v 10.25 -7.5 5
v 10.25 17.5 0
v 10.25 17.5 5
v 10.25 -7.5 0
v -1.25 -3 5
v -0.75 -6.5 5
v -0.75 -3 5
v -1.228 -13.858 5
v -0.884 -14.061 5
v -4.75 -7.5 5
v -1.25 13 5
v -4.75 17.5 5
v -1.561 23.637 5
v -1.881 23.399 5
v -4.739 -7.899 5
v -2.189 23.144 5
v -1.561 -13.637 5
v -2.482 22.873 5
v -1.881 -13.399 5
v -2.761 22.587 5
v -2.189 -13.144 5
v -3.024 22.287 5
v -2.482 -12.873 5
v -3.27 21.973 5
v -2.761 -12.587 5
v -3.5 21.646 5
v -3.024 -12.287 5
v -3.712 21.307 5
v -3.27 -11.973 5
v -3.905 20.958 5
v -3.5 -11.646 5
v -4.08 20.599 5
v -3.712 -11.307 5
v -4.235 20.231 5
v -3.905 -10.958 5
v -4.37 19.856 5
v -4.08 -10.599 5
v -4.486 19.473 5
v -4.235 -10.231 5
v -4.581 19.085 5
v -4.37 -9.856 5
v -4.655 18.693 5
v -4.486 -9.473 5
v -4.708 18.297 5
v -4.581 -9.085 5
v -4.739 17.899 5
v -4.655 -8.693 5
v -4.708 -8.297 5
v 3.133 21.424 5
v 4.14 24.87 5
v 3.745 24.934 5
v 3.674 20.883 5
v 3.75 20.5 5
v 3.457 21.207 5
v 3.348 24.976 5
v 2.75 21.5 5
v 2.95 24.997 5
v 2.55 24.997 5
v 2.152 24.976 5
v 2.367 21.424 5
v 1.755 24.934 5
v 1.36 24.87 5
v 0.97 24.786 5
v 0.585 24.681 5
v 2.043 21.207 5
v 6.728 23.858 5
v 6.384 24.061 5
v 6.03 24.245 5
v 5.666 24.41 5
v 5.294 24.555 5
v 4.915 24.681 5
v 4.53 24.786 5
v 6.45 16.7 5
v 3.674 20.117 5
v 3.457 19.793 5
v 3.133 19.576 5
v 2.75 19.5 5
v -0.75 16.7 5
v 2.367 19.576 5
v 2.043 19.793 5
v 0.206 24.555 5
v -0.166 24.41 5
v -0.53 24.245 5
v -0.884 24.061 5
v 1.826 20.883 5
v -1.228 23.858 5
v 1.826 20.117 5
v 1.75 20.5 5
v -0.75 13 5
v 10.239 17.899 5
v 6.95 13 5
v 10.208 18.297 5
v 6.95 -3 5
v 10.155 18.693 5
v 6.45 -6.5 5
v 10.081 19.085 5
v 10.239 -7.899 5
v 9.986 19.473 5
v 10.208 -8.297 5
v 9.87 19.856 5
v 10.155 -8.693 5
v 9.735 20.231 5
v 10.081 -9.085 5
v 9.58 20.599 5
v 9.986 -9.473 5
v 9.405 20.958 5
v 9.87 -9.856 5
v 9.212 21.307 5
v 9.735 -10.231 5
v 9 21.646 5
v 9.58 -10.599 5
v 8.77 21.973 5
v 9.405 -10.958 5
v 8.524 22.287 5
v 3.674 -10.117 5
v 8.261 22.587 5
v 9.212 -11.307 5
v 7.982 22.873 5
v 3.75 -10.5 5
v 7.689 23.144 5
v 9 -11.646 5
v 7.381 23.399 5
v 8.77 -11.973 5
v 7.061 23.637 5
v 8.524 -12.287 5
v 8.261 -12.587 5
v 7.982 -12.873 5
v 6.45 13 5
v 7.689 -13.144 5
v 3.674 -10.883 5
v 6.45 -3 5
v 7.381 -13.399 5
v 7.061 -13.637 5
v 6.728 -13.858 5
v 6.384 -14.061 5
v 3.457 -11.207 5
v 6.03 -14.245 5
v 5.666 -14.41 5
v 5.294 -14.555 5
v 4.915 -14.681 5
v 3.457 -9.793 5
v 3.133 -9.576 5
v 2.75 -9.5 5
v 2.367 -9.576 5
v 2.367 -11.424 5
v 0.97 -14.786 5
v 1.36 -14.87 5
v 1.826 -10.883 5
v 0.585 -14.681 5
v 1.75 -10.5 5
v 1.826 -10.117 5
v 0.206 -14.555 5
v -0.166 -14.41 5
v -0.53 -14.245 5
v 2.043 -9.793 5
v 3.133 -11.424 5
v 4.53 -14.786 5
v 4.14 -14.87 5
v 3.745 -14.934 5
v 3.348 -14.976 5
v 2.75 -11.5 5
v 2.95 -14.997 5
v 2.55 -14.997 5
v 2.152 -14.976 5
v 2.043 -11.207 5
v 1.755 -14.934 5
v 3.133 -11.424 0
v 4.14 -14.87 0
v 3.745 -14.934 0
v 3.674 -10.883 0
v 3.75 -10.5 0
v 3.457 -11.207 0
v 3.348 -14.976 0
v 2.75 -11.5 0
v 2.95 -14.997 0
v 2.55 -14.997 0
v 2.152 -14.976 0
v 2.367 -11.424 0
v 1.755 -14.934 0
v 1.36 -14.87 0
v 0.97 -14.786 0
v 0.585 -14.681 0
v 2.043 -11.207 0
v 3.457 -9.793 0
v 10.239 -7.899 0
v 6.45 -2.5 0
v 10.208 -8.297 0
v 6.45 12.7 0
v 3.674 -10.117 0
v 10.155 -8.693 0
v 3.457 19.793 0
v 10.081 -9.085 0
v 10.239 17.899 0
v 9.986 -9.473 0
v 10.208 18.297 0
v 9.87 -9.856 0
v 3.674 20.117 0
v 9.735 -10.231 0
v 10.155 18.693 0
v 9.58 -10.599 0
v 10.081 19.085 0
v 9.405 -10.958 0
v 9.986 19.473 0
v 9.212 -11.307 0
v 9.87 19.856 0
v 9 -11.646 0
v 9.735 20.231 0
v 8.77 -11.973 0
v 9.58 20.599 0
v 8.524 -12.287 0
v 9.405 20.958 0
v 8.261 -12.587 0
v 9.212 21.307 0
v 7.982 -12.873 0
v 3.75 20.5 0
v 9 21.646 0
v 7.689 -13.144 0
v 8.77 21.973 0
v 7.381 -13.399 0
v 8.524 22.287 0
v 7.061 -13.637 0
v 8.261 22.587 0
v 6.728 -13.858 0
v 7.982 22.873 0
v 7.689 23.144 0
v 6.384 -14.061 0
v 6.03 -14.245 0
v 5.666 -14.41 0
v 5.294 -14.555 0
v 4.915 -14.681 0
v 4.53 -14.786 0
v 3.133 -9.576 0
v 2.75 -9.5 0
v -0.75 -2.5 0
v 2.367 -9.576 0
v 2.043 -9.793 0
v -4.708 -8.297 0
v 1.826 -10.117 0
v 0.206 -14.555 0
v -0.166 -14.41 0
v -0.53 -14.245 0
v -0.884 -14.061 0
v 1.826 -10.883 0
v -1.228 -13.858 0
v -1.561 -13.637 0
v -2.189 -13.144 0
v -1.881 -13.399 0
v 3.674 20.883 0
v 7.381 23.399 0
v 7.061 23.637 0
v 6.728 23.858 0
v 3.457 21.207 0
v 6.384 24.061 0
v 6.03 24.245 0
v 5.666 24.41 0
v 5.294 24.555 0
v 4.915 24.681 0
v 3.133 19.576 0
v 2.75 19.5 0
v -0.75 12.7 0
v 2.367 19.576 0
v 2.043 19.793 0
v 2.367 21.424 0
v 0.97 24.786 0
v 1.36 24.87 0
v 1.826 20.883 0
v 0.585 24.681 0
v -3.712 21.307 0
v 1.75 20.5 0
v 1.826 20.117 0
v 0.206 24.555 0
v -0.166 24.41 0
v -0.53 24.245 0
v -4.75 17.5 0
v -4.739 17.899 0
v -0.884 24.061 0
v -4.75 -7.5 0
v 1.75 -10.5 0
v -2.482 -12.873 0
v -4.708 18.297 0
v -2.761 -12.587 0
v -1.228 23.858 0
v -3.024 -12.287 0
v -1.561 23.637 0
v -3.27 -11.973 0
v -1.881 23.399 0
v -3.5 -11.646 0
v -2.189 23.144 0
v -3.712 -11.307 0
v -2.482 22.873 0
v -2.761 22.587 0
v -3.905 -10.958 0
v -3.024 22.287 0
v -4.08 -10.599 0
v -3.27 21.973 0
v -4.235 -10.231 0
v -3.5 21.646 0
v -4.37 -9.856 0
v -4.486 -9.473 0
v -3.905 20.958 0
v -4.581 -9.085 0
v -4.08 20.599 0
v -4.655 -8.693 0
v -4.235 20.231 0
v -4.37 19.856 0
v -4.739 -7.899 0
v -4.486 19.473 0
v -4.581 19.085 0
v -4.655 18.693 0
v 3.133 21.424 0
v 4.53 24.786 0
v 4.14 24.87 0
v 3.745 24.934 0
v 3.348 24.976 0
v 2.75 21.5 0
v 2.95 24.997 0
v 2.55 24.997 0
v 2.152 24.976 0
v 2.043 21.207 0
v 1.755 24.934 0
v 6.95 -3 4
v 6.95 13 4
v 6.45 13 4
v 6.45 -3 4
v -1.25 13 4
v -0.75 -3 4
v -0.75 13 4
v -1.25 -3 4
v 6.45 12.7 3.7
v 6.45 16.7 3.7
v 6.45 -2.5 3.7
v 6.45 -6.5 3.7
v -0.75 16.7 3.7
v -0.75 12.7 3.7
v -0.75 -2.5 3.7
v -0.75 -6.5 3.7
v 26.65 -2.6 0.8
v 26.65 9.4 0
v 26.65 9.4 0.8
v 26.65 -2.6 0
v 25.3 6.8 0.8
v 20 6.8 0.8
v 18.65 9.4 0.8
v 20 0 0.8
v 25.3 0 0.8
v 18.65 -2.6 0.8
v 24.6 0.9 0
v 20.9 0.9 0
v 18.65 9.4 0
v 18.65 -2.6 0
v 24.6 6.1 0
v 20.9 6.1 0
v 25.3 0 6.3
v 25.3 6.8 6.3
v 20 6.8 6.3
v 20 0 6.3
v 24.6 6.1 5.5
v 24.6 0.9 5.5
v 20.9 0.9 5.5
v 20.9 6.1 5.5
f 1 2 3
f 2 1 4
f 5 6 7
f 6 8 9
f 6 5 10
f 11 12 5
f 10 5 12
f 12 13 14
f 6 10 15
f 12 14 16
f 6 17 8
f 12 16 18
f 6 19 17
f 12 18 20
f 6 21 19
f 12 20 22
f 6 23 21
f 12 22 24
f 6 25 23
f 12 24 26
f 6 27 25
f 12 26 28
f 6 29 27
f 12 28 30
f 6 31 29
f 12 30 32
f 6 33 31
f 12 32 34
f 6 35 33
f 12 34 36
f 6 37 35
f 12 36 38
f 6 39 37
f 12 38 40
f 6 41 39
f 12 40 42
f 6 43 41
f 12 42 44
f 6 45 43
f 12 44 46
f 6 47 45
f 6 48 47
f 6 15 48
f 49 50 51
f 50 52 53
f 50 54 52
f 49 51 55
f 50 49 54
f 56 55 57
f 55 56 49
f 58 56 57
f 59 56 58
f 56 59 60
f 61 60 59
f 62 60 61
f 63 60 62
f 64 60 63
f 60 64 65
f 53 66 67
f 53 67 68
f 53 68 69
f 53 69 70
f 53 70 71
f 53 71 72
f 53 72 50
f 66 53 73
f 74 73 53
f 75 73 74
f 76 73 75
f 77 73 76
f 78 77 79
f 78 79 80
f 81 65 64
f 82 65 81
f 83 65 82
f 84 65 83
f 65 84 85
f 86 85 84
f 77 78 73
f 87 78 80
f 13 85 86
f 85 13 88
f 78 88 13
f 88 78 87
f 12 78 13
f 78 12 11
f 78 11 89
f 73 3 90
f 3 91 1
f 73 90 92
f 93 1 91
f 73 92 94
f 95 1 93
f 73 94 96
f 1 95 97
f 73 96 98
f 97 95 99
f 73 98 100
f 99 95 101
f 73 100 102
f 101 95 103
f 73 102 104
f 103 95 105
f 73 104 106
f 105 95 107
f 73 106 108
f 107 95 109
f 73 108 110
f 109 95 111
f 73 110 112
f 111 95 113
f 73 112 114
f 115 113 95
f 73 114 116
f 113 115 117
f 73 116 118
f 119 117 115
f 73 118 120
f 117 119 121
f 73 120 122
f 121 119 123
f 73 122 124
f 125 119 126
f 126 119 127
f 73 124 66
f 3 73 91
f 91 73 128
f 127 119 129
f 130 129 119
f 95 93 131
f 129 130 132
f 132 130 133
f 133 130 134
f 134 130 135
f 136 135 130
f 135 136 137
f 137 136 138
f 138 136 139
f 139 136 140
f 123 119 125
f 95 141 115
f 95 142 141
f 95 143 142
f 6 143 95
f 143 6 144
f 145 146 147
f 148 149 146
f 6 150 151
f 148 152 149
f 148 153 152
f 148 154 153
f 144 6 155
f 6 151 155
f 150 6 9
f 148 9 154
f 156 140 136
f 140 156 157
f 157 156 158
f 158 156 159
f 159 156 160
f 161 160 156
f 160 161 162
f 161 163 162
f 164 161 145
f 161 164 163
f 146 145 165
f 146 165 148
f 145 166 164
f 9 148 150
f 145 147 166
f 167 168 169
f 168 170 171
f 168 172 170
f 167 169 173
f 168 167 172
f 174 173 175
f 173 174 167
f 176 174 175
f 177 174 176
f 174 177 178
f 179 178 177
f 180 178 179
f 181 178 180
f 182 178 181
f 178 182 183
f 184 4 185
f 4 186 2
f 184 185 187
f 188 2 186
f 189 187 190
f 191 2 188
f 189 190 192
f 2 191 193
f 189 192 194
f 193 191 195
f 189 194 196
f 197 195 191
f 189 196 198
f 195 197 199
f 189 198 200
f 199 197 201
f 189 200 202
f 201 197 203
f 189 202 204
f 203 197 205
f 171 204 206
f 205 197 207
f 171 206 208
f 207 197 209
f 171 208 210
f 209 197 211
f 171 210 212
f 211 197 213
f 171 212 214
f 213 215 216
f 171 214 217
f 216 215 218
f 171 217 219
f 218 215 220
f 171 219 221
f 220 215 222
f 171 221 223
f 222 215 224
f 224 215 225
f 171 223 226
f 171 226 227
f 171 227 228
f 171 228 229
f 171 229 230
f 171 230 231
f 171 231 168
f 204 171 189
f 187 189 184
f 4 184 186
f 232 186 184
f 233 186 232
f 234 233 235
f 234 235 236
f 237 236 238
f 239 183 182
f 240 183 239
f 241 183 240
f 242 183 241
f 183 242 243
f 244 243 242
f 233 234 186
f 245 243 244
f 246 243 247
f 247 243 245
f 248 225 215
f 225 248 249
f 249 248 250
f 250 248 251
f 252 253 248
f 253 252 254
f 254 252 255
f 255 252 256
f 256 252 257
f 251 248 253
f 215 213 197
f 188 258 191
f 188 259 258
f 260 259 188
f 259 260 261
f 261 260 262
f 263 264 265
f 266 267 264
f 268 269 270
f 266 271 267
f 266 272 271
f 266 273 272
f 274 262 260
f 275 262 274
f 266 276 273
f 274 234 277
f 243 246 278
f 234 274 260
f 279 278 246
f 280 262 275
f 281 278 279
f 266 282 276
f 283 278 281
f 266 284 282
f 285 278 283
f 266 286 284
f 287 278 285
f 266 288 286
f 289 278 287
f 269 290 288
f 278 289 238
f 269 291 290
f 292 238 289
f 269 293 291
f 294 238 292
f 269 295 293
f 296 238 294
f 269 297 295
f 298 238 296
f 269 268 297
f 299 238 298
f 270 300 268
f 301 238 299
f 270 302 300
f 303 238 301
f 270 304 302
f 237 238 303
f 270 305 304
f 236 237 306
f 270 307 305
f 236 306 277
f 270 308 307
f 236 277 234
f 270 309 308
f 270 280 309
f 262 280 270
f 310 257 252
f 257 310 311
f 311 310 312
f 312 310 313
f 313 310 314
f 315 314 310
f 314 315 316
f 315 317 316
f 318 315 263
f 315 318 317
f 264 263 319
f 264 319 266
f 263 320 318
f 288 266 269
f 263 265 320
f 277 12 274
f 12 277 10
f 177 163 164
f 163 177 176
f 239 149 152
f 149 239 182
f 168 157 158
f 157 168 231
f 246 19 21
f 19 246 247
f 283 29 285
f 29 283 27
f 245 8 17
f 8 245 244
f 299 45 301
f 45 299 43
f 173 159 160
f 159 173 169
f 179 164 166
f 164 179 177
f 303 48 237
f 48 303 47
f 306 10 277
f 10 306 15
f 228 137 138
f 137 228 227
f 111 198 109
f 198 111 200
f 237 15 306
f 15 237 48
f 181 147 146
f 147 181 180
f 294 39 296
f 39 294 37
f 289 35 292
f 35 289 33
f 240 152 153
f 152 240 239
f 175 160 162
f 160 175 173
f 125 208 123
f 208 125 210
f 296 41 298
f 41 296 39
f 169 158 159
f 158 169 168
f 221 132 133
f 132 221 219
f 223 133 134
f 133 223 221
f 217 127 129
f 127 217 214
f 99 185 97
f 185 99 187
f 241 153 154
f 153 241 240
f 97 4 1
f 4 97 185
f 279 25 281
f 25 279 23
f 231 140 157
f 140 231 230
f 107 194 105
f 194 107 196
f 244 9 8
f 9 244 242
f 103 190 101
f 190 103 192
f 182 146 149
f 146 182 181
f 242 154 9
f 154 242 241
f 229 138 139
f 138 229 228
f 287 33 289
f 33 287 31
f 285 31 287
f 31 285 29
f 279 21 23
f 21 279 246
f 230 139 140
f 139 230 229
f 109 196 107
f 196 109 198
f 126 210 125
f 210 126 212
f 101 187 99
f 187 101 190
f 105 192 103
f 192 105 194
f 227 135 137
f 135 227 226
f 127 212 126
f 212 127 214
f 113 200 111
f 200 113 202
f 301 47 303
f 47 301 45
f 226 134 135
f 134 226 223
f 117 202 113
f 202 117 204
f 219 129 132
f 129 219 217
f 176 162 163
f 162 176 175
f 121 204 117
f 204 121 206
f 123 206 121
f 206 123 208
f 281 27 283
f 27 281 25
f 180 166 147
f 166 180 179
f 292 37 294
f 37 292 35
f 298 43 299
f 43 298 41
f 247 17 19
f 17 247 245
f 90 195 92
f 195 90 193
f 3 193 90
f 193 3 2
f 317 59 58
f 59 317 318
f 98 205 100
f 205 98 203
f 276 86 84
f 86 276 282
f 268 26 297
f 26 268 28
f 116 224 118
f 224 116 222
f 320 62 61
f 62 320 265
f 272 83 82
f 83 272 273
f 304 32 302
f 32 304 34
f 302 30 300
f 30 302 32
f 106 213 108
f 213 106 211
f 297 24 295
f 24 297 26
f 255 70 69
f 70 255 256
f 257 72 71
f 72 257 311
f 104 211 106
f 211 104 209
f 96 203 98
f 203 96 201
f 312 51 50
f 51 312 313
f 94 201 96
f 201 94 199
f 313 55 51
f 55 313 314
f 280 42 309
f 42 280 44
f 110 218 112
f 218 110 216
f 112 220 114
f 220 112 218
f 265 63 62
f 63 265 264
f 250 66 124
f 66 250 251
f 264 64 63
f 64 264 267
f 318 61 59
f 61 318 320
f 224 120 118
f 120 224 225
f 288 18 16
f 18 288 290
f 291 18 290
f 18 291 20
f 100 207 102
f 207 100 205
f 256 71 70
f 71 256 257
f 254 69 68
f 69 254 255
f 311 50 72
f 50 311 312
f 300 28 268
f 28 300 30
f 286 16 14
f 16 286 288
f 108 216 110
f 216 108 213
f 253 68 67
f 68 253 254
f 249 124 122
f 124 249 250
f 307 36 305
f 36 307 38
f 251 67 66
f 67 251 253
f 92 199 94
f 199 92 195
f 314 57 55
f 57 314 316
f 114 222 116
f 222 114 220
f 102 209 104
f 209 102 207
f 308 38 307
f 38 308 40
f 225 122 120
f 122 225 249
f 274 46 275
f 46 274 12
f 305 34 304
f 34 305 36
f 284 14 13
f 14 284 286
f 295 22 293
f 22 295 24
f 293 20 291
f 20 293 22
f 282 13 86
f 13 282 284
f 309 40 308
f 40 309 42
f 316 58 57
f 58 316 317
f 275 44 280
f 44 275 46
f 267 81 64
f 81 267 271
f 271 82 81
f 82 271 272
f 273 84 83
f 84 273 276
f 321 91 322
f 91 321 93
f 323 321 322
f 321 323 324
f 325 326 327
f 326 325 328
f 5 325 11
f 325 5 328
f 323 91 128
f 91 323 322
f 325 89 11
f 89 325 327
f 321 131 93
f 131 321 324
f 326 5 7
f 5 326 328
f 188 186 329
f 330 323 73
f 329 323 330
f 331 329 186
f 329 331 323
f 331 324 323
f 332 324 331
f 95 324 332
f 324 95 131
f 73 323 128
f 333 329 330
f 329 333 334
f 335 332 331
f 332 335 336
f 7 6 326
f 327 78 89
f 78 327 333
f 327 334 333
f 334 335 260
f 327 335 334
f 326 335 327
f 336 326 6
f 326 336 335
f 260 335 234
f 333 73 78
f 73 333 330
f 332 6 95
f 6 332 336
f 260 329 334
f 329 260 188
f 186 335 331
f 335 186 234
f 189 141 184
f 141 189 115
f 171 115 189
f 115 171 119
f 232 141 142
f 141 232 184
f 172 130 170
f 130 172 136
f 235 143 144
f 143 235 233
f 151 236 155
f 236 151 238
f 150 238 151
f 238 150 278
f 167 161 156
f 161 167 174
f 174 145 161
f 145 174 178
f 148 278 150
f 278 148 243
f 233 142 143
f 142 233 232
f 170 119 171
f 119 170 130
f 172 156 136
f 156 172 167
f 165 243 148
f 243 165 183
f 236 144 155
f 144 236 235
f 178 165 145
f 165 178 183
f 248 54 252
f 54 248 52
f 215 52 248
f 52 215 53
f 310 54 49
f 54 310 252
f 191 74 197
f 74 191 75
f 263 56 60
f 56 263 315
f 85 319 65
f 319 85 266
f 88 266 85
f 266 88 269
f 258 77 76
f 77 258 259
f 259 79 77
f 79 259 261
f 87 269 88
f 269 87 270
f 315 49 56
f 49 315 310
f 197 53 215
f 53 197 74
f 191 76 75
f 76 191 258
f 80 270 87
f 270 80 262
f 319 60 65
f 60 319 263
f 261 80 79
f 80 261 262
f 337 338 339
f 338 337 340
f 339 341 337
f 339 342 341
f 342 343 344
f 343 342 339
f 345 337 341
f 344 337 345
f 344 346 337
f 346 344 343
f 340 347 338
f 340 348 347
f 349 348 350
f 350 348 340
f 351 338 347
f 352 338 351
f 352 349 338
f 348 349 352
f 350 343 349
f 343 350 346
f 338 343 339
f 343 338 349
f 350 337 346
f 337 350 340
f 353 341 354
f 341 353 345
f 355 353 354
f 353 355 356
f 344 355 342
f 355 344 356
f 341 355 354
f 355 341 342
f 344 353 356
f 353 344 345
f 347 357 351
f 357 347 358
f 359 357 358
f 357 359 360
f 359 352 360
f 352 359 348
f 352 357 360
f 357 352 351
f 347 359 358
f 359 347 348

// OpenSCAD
$fa = 1;
$fs = 0.4;

switch_width = 3.5;
switch_depth = 5;
switch_height = 4.5;

wall_thickness = 0.8;
delta = 0.2;

hat_width = switch_width + 2*wall_thickness + delta;
hat_depth = switch_depth + 2*wall_thickness + delta;
hat_height = switch_height + wall_thickness + delta;

rim_width = 8;
rim_depth = 12;
rim_height = wall_thickness;

mount_width = 15;
mount_depth = 40;
mount_height = 5;

hole_width = hat_width + delta;
hole_depth = 8 + 2*wall_thickness + 2*delta;


module Switch_hat() {
    difference() {
        union() {
            translate([-(rim_width - hat_width)/2, -(rim_depth - hat_depth)/2, 0])
            cube([rim_width, rim_depth, rim_height]);

            translate([0, 0, rim_height])
            cube([hat_width, hat_depth, hat_height]);
        }

        translate([(hat_width - switch_width)/2, (hat_depth - switch_depth)/2, -delta])
        cube([switch_width + delta, switch_depth + delta, switch_height + wall_thickness + 2*delta]);
    }
}

module Switch_mount() {
    translate([-(mount_width - hole_width)/2, -(mount_depth - hole_depth)/2, 0])
    difference() {
        union() {
            translate([0, mount_width/2, 0])
            cube([mount_width, mount_depth - mount_width, mount_height]);

            translate([mount_width/2, mount_width/2, 0])
            cylinder(h = mount_height, d = mount_width);

            translate([mount_width/2, mount_depth - mount_width/2, 0])
            cylinder(h = mount_height, d = mount_width);
        }

        translate([(mount_width - rim_width)/2, (mount_depth - rim_depth - 4)/2, mount_height - rim_height - delta])
        cube([rim_width + delta, rim_depth + 4, rim_height + 1]);

        translate([(mount_width - 7)/2, (mount_depth - 23)/2, mount_height - rim_height - 0.5])
        cube([7 + delta, 23 + delta, 4]);

        translate([(mount_width - 7)/2, (mount_depth - 15)/2, -0.5])
        cube([7 + delta, 15 + delta, mount_height + 1]);

        translate([mount_width/2, mount_width/2 - 3, -0.5])
        cylinder(h = mount_height + 1, d = 2);

        translate([mount_width/2, mount_depth - (mount_width/2 - 3), -0.5])
        cylinder(h = mount_height + 1, d = 2);
    }
}

module Switch_hole(height) {
    translate([0, 0, -delta])
    cube([hole_width, hole_depth, height + 2*delta]);
}



Switch_mount();

translate([mount_width + 5, 0, 0])
Switch_hat();
